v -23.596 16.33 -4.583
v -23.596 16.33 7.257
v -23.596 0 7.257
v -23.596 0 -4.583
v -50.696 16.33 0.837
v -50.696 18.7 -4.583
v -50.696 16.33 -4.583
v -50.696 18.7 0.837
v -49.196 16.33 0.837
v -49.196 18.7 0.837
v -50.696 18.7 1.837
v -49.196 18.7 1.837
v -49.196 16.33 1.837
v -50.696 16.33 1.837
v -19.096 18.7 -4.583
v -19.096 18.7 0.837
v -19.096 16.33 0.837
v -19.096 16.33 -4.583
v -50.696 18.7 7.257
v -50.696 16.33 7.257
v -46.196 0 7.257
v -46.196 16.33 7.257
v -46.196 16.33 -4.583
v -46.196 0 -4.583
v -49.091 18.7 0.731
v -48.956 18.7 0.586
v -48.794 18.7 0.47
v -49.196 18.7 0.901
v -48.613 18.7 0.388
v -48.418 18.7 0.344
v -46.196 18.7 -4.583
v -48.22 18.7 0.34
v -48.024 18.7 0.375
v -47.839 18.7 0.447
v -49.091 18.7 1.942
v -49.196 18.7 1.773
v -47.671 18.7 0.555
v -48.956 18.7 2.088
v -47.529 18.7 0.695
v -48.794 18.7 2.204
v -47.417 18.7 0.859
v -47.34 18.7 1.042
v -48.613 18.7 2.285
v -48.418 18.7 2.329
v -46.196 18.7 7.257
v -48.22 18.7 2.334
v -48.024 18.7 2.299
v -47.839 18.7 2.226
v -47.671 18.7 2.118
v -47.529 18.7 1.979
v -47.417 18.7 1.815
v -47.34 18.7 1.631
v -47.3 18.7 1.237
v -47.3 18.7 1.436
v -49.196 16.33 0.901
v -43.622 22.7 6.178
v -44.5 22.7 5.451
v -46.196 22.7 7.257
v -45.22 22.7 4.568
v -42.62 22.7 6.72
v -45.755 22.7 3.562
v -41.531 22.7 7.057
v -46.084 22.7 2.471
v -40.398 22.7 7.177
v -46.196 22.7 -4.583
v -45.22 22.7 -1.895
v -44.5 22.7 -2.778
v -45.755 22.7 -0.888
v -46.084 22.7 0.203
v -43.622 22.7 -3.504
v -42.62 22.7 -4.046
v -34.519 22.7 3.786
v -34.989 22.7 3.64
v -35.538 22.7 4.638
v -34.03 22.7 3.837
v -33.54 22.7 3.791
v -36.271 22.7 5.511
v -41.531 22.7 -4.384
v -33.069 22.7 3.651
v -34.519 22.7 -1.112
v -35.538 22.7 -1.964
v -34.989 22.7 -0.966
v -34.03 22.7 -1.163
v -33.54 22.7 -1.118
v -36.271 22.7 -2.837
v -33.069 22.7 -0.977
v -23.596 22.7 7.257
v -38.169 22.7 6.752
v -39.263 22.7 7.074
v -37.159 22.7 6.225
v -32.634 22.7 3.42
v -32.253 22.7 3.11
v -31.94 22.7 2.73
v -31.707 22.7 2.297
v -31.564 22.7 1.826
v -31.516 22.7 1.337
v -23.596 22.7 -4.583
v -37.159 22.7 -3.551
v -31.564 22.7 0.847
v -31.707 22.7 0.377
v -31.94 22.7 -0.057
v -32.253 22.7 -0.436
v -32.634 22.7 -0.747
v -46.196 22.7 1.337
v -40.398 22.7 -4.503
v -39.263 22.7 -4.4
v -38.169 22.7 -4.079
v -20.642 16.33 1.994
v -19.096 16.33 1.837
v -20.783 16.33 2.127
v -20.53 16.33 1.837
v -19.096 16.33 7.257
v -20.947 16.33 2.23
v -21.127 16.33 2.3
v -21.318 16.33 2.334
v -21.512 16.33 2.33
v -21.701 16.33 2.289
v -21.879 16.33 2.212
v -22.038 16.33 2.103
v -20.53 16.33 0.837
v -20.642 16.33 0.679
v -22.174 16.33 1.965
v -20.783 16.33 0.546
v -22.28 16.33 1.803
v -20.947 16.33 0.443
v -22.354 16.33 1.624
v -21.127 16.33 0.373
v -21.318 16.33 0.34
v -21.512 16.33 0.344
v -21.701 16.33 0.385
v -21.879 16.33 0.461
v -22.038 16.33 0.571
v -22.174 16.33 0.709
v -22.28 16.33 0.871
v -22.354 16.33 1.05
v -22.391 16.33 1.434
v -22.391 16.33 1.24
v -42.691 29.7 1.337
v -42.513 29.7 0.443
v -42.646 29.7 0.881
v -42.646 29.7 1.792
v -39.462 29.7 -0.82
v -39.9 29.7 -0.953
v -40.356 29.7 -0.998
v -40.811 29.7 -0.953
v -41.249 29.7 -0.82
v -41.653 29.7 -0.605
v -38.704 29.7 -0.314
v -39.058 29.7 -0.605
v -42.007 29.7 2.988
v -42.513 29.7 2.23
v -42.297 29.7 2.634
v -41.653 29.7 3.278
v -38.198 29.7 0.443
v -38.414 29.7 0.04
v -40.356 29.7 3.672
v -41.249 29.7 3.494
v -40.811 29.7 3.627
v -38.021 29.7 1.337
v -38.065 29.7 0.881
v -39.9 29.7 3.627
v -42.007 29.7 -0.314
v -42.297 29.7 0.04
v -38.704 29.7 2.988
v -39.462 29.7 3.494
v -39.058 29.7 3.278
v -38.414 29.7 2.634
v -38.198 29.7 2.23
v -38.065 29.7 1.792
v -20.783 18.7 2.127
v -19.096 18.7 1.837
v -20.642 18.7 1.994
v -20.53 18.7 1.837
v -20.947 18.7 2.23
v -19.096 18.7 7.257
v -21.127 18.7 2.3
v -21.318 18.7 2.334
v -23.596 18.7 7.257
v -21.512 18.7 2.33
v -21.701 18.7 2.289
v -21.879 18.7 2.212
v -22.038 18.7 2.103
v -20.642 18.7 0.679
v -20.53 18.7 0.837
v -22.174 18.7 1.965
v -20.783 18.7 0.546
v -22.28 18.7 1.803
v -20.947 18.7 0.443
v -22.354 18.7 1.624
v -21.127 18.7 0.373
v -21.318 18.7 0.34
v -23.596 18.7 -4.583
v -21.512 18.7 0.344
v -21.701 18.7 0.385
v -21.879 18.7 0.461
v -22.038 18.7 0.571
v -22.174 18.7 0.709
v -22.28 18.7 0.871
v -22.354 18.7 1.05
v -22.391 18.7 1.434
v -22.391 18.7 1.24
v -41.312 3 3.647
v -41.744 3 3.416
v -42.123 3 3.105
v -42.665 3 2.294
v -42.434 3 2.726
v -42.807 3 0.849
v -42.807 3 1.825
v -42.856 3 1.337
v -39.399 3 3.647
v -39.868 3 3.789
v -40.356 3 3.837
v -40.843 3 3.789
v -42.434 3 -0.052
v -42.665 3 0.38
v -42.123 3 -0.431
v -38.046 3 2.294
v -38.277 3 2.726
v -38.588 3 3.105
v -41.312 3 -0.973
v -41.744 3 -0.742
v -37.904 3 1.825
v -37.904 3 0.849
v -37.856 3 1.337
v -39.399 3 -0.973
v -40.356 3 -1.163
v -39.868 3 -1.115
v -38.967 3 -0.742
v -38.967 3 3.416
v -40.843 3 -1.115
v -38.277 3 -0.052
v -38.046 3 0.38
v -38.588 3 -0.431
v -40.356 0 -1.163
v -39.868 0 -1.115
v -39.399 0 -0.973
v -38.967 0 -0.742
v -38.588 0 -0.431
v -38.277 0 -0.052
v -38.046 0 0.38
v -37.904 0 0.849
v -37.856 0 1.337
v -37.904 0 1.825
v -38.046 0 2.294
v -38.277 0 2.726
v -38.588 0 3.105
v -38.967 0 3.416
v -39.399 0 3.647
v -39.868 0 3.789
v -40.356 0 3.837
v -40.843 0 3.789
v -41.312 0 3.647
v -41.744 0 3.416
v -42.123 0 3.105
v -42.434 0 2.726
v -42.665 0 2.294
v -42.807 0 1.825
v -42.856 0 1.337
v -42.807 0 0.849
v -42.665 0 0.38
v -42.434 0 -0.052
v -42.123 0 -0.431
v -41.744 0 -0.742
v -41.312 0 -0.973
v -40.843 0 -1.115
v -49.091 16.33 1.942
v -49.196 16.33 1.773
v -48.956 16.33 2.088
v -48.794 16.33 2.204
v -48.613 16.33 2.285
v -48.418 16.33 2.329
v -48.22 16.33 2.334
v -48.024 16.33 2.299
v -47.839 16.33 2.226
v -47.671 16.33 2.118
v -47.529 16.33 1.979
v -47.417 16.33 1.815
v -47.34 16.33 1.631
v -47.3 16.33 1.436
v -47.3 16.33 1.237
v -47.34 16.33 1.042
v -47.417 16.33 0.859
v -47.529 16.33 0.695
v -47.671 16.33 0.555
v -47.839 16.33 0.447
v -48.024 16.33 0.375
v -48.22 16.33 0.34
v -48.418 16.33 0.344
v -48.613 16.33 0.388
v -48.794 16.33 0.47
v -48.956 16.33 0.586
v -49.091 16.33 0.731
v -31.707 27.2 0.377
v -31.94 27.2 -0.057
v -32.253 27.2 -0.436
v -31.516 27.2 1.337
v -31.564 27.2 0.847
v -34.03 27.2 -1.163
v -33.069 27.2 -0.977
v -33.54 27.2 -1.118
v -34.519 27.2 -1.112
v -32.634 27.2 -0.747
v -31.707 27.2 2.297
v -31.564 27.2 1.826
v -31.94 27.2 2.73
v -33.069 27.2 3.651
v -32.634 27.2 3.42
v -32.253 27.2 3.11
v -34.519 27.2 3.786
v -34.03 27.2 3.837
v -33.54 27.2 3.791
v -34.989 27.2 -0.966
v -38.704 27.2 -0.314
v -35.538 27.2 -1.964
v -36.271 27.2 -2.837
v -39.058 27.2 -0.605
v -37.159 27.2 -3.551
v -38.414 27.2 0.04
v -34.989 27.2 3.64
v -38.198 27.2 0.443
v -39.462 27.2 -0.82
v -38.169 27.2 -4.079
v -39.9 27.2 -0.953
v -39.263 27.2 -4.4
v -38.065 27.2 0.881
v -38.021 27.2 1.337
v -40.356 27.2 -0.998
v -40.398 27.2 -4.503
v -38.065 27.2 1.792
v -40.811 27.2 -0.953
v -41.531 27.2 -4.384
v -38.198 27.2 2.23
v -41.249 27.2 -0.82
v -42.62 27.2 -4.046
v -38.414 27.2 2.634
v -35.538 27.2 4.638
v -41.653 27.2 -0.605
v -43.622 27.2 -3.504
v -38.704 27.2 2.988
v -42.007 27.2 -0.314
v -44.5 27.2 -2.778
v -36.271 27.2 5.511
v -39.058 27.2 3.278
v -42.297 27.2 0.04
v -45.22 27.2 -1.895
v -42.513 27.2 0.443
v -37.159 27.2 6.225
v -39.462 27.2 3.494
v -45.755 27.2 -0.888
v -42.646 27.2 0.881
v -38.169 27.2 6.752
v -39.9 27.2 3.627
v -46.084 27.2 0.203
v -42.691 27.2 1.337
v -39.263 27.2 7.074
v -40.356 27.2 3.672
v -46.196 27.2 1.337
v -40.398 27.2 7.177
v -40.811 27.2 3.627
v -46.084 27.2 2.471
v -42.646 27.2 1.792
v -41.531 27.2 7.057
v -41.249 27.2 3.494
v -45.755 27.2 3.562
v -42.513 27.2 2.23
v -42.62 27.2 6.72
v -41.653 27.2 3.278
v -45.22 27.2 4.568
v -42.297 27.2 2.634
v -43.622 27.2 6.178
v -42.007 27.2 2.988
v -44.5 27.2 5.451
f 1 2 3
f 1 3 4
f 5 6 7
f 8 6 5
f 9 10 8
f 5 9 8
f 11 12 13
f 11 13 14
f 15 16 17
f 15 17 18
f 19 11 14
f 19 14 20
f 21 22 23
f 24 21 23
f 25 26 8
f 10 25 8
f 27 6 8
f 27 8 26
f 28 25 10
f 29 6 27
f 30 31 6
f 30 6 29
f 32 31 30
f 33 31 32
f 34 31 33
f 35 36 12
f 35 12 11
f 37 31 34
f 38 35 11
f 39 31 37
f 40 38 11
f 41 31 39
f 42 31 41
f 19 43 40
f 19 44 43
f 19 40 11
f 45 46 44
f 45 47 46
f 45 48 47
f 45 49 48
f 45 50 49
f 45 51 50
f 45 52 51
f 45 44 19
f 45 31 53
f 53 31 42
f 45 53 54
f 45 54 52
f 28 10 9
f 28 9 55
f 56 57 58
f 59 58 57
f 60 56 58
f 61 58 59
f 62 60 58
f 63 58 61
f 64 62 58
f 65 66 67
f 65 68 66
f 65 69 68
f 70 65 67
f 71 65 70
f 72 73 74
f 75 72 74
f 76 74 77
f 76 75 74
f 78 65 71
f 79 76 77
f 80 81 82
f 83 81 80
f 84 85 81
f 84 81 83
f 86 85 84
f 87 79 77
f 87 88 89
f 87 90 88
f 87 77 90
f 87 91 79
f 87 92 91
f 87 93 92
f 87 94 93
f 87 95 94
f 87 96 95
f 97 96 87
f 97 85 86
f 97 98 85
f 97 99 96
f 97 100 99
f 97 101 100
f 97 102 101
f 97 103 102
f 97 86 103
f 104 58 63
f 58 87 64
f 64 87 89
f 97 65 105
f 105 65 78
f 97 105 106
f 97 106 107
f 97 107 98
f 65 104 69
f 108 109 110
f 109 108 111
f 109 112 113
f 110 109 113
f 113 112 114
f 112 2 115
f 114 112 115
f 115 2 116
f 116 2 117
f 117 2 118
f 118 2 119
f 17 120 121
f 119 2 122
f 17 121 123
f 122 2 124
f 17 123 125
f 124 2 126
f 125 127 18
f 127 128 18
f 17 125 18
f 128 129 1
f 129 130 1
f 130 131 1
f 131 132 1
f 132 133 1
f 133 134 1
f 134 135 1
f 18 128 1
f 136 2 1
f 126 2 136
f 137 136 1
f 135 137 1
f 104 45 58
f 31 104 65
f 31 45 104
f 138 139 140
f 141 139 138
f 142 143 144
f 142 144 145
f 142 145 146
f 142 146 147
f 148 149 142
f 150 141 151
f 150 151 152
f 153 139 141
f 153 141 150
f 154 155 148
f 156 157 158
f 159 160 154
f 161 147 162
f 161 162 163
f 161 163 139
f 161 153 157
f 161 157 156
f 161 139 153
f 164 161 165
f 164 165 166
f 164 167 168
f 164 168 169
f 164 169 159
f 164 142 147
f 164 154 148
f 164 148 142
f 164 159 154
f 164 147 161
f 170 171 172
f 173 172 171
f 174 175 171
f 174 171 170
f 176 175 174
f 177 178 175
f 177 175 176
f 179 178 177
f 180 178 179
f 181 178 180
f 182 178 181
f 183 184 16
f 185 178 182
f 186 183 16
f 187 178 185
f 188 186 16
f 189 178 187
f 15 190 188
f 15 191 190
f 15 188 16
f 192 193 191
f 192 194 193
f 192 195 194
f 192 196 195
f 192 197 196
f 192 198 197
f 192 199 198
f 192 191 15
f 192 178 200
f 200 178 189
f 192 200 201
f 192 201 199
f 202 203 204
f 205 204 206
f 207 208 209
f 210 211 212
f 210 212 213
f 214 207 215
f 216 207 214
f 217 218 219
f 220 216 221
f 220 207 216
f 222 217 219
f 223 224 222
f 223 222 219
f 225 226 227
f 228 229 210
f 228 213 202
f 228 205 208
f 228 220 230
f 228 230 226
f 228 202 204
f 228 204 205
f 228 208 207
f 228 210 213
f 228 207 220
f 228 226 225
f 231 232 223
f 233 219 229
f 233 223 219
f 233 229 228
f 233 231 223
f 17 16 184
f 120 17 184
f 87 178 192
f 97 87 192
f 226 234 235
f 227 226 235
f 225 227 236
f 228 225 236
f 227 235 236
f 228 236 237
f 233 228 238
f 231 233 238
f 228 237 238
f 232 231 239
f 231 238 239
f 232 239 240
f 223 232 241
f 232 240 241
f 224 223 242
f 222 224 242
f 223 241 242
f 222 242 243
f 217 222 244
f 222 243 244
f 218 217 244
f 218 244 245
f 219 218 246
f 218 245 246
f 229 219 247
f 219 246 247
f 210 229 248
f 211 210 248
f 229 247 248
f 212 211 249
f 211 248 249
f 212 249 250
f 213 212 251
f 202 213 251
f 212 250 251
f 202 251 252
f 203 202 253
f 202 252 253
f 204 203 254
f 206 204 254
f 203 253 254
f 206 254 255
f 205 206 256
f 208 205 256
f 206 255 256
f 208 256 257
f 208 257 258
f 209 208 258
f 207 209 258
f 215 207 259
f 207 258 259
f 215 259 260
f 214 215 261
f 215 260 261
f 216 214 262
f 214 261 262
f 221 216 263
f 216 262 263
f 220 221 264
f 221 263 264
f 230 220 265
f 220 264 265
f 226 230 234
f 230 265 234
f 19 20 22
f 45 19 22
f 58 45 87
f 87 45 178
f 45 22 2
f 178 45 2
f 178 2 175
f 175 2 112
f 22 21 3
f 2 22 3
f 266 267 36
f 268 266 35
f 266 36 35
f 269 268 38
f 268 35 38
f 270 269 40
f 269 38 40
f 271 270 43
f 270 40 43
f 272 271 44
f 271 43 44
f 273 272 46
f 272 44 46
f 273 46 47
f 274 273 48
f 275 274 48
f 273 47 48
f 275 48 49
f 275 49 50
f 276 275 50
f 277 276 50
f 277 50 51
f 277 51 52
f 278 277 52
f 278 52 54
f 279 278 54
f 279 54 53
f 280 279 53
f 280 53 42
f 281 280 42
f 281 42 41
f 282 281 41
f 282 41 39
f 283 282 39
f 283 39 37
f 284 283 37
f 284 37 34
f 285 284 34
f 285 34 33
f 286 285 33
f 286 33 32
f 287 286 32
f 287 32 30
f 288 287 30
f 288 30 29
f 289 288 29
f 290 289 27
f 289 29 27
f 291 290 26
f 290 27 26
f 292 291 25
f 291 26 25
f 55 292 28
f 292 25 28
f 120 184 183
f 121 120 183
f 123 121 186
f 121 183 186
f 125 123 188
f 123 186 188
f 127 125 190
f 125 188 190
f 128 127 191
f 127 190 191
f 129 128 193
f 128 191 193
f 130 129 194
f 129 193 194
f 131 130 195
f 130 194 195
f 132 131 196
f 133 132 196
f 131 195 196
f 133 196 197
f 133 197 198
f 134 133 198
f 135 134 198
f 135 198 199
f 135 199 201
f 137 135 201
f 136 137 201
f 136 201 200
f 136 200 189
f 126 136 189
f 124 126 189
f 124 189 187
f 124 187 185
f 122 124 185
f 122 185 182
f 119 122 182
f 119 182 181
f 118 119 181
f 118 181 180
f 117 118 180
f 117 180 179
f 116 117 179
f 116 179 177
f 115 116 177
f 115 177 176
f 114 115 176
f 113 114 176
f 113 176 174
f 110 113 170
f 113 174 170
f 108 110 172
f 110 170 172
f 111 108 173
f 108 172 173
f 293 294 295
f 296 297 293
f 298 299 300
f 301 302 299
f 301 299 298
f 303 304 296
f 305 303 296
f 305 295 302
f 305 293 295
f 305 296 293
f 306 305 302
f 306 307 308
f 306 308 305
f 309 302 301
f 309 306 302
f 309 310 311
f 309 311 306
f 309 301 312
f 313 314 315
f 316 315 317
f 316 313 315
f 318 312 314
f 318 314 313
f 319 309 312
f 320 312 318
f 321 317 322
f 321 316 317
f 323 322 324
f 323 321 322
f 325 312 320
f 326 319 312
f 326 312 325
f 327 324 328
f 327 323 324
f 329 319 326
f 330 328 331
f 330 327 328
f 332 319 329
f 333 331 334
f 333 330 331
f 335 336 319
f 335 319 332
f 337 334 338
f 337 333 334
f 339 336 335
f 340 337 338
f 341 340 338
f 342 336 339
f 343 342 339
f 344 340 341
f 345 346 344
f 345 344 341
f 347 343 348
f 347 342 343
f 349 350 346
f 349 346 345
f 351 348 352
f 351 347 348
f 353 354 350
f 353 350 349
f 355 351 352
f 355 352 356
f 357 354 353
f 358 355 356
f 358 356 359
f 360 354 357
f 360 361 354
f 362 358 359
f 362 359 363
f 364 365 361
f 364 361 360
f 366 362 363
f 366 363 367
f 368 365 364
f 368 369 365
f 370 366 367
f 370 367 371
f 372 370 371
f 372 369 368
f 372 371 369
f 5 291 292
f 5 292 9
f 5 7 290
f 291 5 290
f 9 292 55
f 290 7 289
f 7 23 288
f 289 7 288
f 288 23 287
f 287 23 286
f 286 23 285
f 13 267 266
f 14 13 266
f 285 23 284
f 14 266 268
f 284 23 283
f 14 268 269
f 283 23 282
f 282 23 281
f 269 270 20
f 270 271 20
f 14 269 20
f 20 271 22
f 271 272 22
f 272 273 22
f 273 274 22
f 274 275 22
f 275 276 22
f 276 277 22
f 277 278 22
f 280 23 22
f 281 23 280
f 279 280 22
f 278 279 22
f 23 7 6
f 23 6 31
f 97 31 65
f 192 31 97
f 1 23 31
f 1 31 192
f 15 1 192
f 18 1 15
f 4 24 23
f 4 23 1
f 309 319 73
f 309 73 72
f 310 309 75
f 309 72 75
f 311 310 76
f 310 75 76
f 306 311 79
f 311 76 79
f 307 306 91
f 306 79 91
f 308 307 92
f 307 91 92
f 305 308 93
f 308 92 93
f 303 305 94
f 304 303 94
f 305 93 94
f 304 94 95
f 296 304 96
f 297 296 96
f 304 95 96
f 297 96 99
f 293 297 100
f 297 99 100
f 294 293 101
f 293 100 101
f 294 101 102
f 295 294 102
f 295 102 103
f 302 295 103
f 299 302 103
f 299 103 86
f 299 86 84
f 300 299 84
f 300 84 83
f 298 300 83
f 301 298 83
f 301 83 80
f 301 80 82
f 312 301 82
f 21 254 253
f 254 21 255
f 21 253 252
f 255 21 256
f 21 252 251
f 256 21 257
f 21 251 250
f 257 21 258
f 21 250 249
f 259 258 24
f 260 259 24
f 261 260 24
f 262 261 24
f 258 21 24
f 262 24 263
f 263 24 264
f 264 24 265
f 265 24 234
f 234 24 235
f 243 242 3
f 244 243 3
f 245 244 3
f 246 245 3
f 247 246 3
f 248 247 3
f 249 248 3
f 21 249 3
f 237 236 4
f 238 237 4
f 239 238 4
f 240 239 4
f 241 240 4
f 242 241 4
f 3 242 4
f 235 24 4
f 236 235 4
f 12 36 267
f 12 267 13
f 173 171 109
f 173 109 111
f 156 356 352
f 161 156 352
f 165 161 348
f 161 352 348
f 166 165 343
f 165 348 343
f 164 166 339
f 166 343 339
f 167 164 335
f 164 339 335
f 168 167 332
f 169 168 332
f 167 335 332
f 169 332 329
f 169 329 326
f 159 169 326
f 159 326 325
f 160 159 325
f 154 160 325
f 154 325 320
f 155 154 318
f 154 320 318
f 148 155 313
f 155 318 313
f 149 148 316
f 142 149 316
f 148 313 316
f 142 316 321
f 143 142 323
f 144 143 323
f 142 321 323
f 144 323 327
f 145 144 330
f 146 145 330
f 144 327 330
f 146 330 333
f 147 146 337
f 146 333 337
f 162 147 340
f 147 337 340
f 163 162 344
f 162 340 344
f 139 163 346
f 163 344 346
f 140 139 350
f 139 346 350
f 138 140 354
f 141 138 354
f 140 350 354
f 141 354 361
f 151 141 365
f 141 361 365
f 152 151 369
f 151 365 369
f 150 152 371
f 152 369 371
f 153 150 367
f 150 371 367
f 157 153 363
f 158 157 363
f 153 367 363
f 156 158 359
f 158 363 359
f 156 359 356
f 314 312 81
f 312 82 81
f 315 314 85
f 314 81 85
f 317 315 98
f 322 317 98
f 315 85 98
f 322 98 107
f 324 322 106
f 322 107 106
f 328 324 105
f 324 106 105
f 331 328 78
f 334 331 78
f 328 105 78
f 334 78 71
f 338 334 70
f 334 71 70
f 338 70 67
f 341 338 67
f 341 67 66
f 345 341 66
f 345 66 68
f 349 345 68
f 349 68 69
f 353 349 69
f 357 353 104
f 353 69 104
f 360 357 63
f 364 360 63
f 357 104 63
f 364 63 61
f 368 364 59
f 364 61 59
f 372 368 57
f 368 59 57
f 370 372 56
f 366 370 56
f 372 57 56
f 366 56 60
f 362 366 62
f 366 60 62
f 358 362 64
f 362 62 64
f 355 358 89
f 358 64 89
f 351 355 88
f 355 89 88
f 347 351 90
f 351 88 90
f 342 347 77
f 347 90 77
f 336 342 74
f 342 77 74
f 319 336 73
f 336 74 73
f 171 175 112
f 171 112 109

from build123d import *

# Parameters (mm, degrees)
SKETCH1_W            = 22.6
SKETCH1_H            = 11.84
BOSS_EXTRUDE1_DEPTH  = 22.7
SKETCH4_R            = 5.84
BOSS_EXTRUDE6_DEPTH  = 4.5
SKETCH12_R           = 2.335
BOSS_EXTRUDE7_DEPTH  = 2.5
SKETCH13_R           = 2.5
BOSS_EXTRUDE8_DEPTH  = 4.5
SKETCH14_W           = 11.84
SKETCH14_H           = 2.37
BOSS_EXTRUDE10_DEPTH = 4.5
SKETCH15_R           = 1
SKETCH15_W           = 1.5
SKETCH15_H           = 1
CUT_EXTRUDE3_DEPTH   = 51.362478675
SKETCH16_W           = 11.84
SKETCH16_H           = 2.37
BOSS_EXTRUDE11_DEPTH = 4.5
SKETCH17_R           = 1
SKETCH17_W           = 1.5
SKETCH17_H           = 1
CUT_EXTRUDE4_DEPTH   = 55.51962078
SKETCH18_R           = 2.5
CUT_EXTRUDE5_DEPTH   = 3


with BuildPart() as part:
    # Sketch1 → Boss-Extrude1 (new body)
    with BuildSketch(Plane(origin=(0, 0, 0), x_dir=(1, 0, 0), z_dir=(0, 1, 0))):
        with Locations((-34.895532414, -1.336861806)):
            Rectangle(SKETCH1_W, SKETCH1_H)
    extrude(amount=BOSS_EXTRUDE1_DEPTH)

    # Sketch4 → Boss-Extrude6 (add)
    with BuildSketch(Plane(origin=(0, 22.7, 0), x_dir=(-1, 0, 0), z_dir=(0, 1, 0))):
        with Locations((40.355532414, 1.336861806)):
            Circle(SKETCH4_R)
    extrude(amount=BOSS_EXTRUDE6_DEPTH)

    # Sketch12 → Boss-Extrude7 (add)
    with BuildSketch(Plane(origin=(0, 27.2, 0), x_dir=(-1, 0, 0), z_dir=(0, 1, 0))):
        with Locations(Location((40.355532414, 1.336861806, 0), (0, 0, 90))):
            Circle(SKETCH12_R)
    extrude(amount=BOSS_EXTRUDE7_DEPTH)

    # Sketch13 → Boss-Extrude8 (add)
    with BuildSketch(Plane(origin=(0, 22.7, 0), x_dir=(-1, 0, 0), z_dir=(0, 1, 0))):
        with Locations((34.015532414, 1.336861806)):
            Circle(SKETCH13_R)
    extrude(amount=BOSS_EXTRUDE8_DEPTH)

    # Sketch14 → Boss-Extrude10 (add)
    with BuildSketch(Plane(origin=(-23.595532414, 0, 0), x_dir=(0, 0, -1), z_dir=(1, 0, 0))):
        with Locations((-1.336861806, 17.515)):
            Rectangle(SKETCH14_W, SKETCH14_H)
    extrude(amount=BOSS_EXTRUDE10_DEPTH)

    # Sketch15 → Cut-Extrude3 (cut, through all)
    with BuildSketch(Plane(origin=(0, 18.7, 0), x_dir=(-1, 0, 0), z_dir=(0, 1, 0))):
        with Locations((21.395532414, 1.336861806)):
            Circle(SKETCH15_R)
        with Locations((48.395532414, 1.336861806)):
            Circle(SKETCH15_R)
        with Locations((19.845532414, 1.336861806)):
            Rectangle(SKETCH15_W, SKETCH15_H)
    extrude(amount=-CUT_EXTRUDE3_DEPTH, mode=Mode.SUBTRACT)

    # Sketch16 → Boss-Extrude11 (add)
    with BuildSketch(Plane.ZY.offset(46.195532414)):
        with Locations((1.336861806, 17.515)):
            Rectangle(SKETCH16_W, SKETCH16_H)
    extrude(amount=BOSS_EXTRUDE11_DEPTH)

    # Sketch17 → Cut-Extrude4 (cut, through all)
    with BuildSketch(Plane(origin=(0, 18.7, 0), x_dir=(-1, 0, 0), z_dir=(0, 1, 0))):
        with Locations((48.295532414, 1.336861806)):
            Circle(SKETCH17_R)
        with Locations((49.945532414, 1.336861806)):
            Rectangle(SKETCH17_W, SKETCH17_H)
    extrude(amount=-CUT_EXTRUDE4_DEPTH, mode=Mode.SUBTRACT)

    # Sketch18 → Cut-Extrude5 (cut)
    with BuildSketch(Plane(origin=(0, 0, 0), x_dir=(-1, 0, 0), z_dir=(0, -1, 0))):
        with Locations(Location((40.355532414, -1.336861806, 0), (0, 0, 90))):
            Circle(SKETCH18_R)
    extrude(amount=-CUT_EXTRUDE5_DEPTH, mode=Mode.SUBTRACT)


solid = part.part
